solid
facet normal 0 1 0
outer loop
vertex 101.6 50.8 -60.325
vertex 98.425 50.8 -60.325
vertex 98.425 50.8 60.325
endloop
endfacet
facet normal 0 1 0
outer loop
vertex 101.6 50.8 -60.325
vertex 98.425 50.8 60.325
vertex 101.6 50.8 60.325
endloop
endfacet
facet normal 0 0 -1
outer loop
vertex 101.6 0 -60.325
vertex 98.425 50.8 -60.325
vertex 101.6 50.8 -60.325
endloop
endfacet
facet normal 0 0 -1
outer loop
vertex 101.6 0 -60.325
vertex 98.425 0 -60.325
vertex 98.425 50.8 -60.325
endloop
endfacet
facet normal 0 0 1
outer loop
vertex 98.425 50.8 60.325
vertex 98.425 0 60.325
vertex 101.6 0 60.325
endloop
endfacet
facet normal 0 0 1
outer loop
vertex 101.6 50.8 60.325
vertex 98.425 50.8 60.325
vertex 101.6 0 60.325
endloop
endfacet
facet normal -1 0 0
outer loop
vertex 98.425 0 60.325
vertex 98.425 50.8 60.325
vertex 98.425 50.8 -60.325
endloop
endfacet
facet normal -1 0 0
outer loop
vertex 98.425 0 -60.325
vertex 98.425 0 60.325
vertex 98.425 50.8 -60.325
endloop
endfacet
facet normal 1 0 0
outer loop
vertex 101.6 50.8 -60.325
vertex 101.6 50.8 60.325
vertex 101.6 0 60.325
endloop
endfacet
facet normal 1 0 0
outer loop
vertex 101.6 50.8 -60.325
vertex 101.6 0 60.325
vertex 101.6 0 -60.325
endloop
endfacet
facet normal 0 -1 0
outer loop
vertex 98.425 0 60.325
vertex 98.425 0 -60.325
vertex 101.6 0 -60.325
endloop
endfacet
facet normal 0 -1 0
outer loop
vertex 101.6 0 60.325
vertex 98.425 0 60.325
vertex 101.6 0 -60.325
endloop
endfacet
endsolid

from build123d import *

# Parameters (mm, degrees)
SKETCH1_W           = 203.2
SKETCH1_H           = 120.65
BOSS_EXTRUDE1_DEPTH = 50.8
SKETCH2_W           = 196.85
SKETCH2_H           = 114.3
CUT_EXTRUDE1_DEPTH  = 51.8
SKETCH4_W           = 203.2
SKETCH4_H           = 120.65
SKETCH4_W_2         = 196.85
SKETCH4_H_2         = 114.3
BOSS_EXTRUDE2_DEPTH = 6.35
CUT_EXTRUDE5_DEPTH  = 121.65
CUT_EXTRUDE6_REACH  = 205.2
CUT_EXTRUDE7_REACH  = 205.2
SKETCH13_R          = 12.55395
SKETCH14_W          = 200.025
SKETCH14_H          = 120.65
CUT_EXTRUDE8_DEPTH  = 51.8
BOSS_EXTRUDE3_DEPTH = 3.175


with BuildPart() as part:
    # Sketch1 → Boss-Extrude1 (new body)
    with BuildSketch(Plane(origin=(0, 0, 0), x_dir=(1, 0, 0), z_dir=(0, 1, 0))):
        Rectangle(SKETCH1_W, SKETCH1_H)
    extrude(amount=BOSS_EXTRUDE1_DEPTH)

    # Sketch2 → Cut-Extrude1 (cut, through all)
    with BuildSketch(Plane(origin=(0, 50.8, 0), x_dir=(1, 0, 0), z_dir=(0, 1, 0))):
        Rectangle(SKETCH2_W, SKETCH2_H)
    extrude(amount=-CUT_EXTRUDE1_DEPTH, mode=Mode.SUBTRACT)

    # Sketch4 → Boss-Extrude2 (add)
    with BuildSketch(Plane(origin=(0, 50.8, 0), x_dir=(1, 0, 0), z_dir=(0, 1, 0))):
        Rectangle(SKETCH4_W, SKETCH4_H)
        Rectangle(SKETCH4_W_2, SKETCH4_H_2, mode=Mode.SUBTRACT)
    extrude(amount=-BOSS_EXTRUDE2_DEPTH)

    # Sketch10 → Cut-Extrude5 (cut, through all)
    with BuildSketch(Plane.XY.offset(60.325)):
        with BuildLine():
            ThreePointArc((-65.9511, 22.225), (-81.206975571, 31.167602912), (-81.556705839, 13.4874))
            Line((-81.556705839, 13.4874), (-70.843294161, 13.4874))
            ThreePointArc((-70.843294161, 13.4874), (-67.257397088, 17.218024429), (-65.9511, 22.225))
        make_face()
        with BuildLine():
            ThreePointArc((-15.1511, 22.225), (-30.406975571, 31.167602912), (-30.756705839, 13.4874))
            Line((-30.756705839, 13.4874), (-20.043294161, 13.4874))
            ThreePointArc((-20.043294161, 13.4874), (-16.457397088, 17.218024429), (-15.1511, 22.225))
        make_face()
        with BuildLine():
            ThreePointArc((35.6489, 22.225), (20.393024429, 31.167602912), (20.043294161, 13.4874))
            Line((20.043294161, 13.4874), (30.756705839, 13.4874))
            ThreePointArc((30.756705839, 13.4874), (34.342602912, 17.218024429), (35.6489, 22.225))
        make_face()
        with BuildLine():
            Line((70.843294161, 13.4874), (81.556705839, 13.4874))
            ThreePointArc((81.556705839, 13.4874), (85.142602912, 17.218024429), (86.4489, 22.225))
            ThreePointArc((86.4489, 22.225), (71.193024429, 31.167602912), (70.843294161, 13.4874))
        make_face()
    extrude(amount=-CUT_EXTRUDE5_DEPTH, mode=Mode.SUBTRACT)

    # Sketch12 → Cut-Extrude6 (cut, up to next)
    with BuildSketch(Plane(origin=(101.6, 0, 0), x_dir=(0, 0, -1), z_dir=(1, 0, 0)), mode=Mode.PRIVATE) as cut_extrude6_sk1:
        with BuildLine():
            ThreePointArc((-20.043294161, 19.8374), (-25.4, 38.8239), (-30.756705839, 19.8374))
            Line((-30.756705839, 19.8374), (-20.043294161, 19.8374))
        make_face()
    cut_extrude6_tool1 = extrude(cut_extrude6_sk1.sketch, amount=-CUT_EXTRUDE6_REACH, mode=Mode.PRIVATE) & part.part
    add(cut_extrude6_tool1.solids().sort_by_distance((101.6, 28.896198, 25.4))[0], mode=Mode.SUBTRACT)
    # Sketch12 → Cut-Extrude6 (cut, up to next)
    with BuildSketch(Plane(origin=(101.6, 0, 0), x_dir=(0, 0, -1), z_dir=(1, 0, 0)), mode=Mode.PRIVATE) as cut_extrude6_sk2:
        with BuildLine():
            ThreePointArc((30.756705839, 19.8374), (25.4, 38.8239), (20.043294161, 19.8374))
            Line((20.043294161, 19.8374), (30.756705839, 19.8374))
        make_face()
    cut_extrude6_tool2 = extrude(cut_extrude6_sk2.sketch, amount=-CUT_EXTRUDE6_REACH, mode=Mode.PRIVATE) & part.part
    add(cut_extrude6_tool2.solids().sort_by_distance((101.6, 28.896198, -25.4))[0], mode=Mode.SUBTRACT)

    # Sketch13 → Cut-Extrude7 (cut, up to next)
    with BuildSketch(Plane.ZY.offset(101.6), mode=Mode.PRIVATE) as cut_extrude7_sk1:
        with Locations((15.875, 28.575)):
            Circle(SKETCH13_R)
    cut_extrude7_tool1 = extrude(cut_extrude7_sk1.sketch, amount=-CUT_EXTRUDE7_REACH, mode=Mode.PRIVATE) & part.part
    add(cut_extrude7_tool1.solids().sort_by_distance((-101.6, 28.575, 15.875))[0], mode=Mode.SUBTRACT)

    # Sketch14 → Cut-Extrude8 (cut, through all)
    with BuildSketch(Plane(origin=(0, 50.8, 0), x_dir=(1, 0, 0), z_dir=(0, 1, 0))):
        with Locations((-1.5875, 0)):
            Rectangle(SKETCH14_W, SKETCH14_H)
    extrude(amount=-CUT_EXTRUDE8_DEPTH, mode=Mode.SUBTRACT)

    # Sketch15 → Boss-Extrude3 (add)
    with BuildSketch(Plane(origin=(101.6, 0, 0), x_dir=(0, 0, -1), z_dir=(1, 0, 0))):
        with BuildLine():
            Line((20.043294161, 19.8374), (30.756705839, 19.8374))
            ThreePointArc((30.756705839, 19.8374), (25.4, 38.8239), (20.043294161, 19.8374))
        make_face()
        with BuildLine():
            Line((-30.756705839, 19.8374), (-20.043294161, 19.8374))
            ThreePointArc((-20.043294161, 19.8374), (-25.4, 38.8239), (-30.756705839, 19.8374))
        make_face()
    extrude(amount=-BOSS_EXTRUDE3_DEPTH)


solid = part.part
